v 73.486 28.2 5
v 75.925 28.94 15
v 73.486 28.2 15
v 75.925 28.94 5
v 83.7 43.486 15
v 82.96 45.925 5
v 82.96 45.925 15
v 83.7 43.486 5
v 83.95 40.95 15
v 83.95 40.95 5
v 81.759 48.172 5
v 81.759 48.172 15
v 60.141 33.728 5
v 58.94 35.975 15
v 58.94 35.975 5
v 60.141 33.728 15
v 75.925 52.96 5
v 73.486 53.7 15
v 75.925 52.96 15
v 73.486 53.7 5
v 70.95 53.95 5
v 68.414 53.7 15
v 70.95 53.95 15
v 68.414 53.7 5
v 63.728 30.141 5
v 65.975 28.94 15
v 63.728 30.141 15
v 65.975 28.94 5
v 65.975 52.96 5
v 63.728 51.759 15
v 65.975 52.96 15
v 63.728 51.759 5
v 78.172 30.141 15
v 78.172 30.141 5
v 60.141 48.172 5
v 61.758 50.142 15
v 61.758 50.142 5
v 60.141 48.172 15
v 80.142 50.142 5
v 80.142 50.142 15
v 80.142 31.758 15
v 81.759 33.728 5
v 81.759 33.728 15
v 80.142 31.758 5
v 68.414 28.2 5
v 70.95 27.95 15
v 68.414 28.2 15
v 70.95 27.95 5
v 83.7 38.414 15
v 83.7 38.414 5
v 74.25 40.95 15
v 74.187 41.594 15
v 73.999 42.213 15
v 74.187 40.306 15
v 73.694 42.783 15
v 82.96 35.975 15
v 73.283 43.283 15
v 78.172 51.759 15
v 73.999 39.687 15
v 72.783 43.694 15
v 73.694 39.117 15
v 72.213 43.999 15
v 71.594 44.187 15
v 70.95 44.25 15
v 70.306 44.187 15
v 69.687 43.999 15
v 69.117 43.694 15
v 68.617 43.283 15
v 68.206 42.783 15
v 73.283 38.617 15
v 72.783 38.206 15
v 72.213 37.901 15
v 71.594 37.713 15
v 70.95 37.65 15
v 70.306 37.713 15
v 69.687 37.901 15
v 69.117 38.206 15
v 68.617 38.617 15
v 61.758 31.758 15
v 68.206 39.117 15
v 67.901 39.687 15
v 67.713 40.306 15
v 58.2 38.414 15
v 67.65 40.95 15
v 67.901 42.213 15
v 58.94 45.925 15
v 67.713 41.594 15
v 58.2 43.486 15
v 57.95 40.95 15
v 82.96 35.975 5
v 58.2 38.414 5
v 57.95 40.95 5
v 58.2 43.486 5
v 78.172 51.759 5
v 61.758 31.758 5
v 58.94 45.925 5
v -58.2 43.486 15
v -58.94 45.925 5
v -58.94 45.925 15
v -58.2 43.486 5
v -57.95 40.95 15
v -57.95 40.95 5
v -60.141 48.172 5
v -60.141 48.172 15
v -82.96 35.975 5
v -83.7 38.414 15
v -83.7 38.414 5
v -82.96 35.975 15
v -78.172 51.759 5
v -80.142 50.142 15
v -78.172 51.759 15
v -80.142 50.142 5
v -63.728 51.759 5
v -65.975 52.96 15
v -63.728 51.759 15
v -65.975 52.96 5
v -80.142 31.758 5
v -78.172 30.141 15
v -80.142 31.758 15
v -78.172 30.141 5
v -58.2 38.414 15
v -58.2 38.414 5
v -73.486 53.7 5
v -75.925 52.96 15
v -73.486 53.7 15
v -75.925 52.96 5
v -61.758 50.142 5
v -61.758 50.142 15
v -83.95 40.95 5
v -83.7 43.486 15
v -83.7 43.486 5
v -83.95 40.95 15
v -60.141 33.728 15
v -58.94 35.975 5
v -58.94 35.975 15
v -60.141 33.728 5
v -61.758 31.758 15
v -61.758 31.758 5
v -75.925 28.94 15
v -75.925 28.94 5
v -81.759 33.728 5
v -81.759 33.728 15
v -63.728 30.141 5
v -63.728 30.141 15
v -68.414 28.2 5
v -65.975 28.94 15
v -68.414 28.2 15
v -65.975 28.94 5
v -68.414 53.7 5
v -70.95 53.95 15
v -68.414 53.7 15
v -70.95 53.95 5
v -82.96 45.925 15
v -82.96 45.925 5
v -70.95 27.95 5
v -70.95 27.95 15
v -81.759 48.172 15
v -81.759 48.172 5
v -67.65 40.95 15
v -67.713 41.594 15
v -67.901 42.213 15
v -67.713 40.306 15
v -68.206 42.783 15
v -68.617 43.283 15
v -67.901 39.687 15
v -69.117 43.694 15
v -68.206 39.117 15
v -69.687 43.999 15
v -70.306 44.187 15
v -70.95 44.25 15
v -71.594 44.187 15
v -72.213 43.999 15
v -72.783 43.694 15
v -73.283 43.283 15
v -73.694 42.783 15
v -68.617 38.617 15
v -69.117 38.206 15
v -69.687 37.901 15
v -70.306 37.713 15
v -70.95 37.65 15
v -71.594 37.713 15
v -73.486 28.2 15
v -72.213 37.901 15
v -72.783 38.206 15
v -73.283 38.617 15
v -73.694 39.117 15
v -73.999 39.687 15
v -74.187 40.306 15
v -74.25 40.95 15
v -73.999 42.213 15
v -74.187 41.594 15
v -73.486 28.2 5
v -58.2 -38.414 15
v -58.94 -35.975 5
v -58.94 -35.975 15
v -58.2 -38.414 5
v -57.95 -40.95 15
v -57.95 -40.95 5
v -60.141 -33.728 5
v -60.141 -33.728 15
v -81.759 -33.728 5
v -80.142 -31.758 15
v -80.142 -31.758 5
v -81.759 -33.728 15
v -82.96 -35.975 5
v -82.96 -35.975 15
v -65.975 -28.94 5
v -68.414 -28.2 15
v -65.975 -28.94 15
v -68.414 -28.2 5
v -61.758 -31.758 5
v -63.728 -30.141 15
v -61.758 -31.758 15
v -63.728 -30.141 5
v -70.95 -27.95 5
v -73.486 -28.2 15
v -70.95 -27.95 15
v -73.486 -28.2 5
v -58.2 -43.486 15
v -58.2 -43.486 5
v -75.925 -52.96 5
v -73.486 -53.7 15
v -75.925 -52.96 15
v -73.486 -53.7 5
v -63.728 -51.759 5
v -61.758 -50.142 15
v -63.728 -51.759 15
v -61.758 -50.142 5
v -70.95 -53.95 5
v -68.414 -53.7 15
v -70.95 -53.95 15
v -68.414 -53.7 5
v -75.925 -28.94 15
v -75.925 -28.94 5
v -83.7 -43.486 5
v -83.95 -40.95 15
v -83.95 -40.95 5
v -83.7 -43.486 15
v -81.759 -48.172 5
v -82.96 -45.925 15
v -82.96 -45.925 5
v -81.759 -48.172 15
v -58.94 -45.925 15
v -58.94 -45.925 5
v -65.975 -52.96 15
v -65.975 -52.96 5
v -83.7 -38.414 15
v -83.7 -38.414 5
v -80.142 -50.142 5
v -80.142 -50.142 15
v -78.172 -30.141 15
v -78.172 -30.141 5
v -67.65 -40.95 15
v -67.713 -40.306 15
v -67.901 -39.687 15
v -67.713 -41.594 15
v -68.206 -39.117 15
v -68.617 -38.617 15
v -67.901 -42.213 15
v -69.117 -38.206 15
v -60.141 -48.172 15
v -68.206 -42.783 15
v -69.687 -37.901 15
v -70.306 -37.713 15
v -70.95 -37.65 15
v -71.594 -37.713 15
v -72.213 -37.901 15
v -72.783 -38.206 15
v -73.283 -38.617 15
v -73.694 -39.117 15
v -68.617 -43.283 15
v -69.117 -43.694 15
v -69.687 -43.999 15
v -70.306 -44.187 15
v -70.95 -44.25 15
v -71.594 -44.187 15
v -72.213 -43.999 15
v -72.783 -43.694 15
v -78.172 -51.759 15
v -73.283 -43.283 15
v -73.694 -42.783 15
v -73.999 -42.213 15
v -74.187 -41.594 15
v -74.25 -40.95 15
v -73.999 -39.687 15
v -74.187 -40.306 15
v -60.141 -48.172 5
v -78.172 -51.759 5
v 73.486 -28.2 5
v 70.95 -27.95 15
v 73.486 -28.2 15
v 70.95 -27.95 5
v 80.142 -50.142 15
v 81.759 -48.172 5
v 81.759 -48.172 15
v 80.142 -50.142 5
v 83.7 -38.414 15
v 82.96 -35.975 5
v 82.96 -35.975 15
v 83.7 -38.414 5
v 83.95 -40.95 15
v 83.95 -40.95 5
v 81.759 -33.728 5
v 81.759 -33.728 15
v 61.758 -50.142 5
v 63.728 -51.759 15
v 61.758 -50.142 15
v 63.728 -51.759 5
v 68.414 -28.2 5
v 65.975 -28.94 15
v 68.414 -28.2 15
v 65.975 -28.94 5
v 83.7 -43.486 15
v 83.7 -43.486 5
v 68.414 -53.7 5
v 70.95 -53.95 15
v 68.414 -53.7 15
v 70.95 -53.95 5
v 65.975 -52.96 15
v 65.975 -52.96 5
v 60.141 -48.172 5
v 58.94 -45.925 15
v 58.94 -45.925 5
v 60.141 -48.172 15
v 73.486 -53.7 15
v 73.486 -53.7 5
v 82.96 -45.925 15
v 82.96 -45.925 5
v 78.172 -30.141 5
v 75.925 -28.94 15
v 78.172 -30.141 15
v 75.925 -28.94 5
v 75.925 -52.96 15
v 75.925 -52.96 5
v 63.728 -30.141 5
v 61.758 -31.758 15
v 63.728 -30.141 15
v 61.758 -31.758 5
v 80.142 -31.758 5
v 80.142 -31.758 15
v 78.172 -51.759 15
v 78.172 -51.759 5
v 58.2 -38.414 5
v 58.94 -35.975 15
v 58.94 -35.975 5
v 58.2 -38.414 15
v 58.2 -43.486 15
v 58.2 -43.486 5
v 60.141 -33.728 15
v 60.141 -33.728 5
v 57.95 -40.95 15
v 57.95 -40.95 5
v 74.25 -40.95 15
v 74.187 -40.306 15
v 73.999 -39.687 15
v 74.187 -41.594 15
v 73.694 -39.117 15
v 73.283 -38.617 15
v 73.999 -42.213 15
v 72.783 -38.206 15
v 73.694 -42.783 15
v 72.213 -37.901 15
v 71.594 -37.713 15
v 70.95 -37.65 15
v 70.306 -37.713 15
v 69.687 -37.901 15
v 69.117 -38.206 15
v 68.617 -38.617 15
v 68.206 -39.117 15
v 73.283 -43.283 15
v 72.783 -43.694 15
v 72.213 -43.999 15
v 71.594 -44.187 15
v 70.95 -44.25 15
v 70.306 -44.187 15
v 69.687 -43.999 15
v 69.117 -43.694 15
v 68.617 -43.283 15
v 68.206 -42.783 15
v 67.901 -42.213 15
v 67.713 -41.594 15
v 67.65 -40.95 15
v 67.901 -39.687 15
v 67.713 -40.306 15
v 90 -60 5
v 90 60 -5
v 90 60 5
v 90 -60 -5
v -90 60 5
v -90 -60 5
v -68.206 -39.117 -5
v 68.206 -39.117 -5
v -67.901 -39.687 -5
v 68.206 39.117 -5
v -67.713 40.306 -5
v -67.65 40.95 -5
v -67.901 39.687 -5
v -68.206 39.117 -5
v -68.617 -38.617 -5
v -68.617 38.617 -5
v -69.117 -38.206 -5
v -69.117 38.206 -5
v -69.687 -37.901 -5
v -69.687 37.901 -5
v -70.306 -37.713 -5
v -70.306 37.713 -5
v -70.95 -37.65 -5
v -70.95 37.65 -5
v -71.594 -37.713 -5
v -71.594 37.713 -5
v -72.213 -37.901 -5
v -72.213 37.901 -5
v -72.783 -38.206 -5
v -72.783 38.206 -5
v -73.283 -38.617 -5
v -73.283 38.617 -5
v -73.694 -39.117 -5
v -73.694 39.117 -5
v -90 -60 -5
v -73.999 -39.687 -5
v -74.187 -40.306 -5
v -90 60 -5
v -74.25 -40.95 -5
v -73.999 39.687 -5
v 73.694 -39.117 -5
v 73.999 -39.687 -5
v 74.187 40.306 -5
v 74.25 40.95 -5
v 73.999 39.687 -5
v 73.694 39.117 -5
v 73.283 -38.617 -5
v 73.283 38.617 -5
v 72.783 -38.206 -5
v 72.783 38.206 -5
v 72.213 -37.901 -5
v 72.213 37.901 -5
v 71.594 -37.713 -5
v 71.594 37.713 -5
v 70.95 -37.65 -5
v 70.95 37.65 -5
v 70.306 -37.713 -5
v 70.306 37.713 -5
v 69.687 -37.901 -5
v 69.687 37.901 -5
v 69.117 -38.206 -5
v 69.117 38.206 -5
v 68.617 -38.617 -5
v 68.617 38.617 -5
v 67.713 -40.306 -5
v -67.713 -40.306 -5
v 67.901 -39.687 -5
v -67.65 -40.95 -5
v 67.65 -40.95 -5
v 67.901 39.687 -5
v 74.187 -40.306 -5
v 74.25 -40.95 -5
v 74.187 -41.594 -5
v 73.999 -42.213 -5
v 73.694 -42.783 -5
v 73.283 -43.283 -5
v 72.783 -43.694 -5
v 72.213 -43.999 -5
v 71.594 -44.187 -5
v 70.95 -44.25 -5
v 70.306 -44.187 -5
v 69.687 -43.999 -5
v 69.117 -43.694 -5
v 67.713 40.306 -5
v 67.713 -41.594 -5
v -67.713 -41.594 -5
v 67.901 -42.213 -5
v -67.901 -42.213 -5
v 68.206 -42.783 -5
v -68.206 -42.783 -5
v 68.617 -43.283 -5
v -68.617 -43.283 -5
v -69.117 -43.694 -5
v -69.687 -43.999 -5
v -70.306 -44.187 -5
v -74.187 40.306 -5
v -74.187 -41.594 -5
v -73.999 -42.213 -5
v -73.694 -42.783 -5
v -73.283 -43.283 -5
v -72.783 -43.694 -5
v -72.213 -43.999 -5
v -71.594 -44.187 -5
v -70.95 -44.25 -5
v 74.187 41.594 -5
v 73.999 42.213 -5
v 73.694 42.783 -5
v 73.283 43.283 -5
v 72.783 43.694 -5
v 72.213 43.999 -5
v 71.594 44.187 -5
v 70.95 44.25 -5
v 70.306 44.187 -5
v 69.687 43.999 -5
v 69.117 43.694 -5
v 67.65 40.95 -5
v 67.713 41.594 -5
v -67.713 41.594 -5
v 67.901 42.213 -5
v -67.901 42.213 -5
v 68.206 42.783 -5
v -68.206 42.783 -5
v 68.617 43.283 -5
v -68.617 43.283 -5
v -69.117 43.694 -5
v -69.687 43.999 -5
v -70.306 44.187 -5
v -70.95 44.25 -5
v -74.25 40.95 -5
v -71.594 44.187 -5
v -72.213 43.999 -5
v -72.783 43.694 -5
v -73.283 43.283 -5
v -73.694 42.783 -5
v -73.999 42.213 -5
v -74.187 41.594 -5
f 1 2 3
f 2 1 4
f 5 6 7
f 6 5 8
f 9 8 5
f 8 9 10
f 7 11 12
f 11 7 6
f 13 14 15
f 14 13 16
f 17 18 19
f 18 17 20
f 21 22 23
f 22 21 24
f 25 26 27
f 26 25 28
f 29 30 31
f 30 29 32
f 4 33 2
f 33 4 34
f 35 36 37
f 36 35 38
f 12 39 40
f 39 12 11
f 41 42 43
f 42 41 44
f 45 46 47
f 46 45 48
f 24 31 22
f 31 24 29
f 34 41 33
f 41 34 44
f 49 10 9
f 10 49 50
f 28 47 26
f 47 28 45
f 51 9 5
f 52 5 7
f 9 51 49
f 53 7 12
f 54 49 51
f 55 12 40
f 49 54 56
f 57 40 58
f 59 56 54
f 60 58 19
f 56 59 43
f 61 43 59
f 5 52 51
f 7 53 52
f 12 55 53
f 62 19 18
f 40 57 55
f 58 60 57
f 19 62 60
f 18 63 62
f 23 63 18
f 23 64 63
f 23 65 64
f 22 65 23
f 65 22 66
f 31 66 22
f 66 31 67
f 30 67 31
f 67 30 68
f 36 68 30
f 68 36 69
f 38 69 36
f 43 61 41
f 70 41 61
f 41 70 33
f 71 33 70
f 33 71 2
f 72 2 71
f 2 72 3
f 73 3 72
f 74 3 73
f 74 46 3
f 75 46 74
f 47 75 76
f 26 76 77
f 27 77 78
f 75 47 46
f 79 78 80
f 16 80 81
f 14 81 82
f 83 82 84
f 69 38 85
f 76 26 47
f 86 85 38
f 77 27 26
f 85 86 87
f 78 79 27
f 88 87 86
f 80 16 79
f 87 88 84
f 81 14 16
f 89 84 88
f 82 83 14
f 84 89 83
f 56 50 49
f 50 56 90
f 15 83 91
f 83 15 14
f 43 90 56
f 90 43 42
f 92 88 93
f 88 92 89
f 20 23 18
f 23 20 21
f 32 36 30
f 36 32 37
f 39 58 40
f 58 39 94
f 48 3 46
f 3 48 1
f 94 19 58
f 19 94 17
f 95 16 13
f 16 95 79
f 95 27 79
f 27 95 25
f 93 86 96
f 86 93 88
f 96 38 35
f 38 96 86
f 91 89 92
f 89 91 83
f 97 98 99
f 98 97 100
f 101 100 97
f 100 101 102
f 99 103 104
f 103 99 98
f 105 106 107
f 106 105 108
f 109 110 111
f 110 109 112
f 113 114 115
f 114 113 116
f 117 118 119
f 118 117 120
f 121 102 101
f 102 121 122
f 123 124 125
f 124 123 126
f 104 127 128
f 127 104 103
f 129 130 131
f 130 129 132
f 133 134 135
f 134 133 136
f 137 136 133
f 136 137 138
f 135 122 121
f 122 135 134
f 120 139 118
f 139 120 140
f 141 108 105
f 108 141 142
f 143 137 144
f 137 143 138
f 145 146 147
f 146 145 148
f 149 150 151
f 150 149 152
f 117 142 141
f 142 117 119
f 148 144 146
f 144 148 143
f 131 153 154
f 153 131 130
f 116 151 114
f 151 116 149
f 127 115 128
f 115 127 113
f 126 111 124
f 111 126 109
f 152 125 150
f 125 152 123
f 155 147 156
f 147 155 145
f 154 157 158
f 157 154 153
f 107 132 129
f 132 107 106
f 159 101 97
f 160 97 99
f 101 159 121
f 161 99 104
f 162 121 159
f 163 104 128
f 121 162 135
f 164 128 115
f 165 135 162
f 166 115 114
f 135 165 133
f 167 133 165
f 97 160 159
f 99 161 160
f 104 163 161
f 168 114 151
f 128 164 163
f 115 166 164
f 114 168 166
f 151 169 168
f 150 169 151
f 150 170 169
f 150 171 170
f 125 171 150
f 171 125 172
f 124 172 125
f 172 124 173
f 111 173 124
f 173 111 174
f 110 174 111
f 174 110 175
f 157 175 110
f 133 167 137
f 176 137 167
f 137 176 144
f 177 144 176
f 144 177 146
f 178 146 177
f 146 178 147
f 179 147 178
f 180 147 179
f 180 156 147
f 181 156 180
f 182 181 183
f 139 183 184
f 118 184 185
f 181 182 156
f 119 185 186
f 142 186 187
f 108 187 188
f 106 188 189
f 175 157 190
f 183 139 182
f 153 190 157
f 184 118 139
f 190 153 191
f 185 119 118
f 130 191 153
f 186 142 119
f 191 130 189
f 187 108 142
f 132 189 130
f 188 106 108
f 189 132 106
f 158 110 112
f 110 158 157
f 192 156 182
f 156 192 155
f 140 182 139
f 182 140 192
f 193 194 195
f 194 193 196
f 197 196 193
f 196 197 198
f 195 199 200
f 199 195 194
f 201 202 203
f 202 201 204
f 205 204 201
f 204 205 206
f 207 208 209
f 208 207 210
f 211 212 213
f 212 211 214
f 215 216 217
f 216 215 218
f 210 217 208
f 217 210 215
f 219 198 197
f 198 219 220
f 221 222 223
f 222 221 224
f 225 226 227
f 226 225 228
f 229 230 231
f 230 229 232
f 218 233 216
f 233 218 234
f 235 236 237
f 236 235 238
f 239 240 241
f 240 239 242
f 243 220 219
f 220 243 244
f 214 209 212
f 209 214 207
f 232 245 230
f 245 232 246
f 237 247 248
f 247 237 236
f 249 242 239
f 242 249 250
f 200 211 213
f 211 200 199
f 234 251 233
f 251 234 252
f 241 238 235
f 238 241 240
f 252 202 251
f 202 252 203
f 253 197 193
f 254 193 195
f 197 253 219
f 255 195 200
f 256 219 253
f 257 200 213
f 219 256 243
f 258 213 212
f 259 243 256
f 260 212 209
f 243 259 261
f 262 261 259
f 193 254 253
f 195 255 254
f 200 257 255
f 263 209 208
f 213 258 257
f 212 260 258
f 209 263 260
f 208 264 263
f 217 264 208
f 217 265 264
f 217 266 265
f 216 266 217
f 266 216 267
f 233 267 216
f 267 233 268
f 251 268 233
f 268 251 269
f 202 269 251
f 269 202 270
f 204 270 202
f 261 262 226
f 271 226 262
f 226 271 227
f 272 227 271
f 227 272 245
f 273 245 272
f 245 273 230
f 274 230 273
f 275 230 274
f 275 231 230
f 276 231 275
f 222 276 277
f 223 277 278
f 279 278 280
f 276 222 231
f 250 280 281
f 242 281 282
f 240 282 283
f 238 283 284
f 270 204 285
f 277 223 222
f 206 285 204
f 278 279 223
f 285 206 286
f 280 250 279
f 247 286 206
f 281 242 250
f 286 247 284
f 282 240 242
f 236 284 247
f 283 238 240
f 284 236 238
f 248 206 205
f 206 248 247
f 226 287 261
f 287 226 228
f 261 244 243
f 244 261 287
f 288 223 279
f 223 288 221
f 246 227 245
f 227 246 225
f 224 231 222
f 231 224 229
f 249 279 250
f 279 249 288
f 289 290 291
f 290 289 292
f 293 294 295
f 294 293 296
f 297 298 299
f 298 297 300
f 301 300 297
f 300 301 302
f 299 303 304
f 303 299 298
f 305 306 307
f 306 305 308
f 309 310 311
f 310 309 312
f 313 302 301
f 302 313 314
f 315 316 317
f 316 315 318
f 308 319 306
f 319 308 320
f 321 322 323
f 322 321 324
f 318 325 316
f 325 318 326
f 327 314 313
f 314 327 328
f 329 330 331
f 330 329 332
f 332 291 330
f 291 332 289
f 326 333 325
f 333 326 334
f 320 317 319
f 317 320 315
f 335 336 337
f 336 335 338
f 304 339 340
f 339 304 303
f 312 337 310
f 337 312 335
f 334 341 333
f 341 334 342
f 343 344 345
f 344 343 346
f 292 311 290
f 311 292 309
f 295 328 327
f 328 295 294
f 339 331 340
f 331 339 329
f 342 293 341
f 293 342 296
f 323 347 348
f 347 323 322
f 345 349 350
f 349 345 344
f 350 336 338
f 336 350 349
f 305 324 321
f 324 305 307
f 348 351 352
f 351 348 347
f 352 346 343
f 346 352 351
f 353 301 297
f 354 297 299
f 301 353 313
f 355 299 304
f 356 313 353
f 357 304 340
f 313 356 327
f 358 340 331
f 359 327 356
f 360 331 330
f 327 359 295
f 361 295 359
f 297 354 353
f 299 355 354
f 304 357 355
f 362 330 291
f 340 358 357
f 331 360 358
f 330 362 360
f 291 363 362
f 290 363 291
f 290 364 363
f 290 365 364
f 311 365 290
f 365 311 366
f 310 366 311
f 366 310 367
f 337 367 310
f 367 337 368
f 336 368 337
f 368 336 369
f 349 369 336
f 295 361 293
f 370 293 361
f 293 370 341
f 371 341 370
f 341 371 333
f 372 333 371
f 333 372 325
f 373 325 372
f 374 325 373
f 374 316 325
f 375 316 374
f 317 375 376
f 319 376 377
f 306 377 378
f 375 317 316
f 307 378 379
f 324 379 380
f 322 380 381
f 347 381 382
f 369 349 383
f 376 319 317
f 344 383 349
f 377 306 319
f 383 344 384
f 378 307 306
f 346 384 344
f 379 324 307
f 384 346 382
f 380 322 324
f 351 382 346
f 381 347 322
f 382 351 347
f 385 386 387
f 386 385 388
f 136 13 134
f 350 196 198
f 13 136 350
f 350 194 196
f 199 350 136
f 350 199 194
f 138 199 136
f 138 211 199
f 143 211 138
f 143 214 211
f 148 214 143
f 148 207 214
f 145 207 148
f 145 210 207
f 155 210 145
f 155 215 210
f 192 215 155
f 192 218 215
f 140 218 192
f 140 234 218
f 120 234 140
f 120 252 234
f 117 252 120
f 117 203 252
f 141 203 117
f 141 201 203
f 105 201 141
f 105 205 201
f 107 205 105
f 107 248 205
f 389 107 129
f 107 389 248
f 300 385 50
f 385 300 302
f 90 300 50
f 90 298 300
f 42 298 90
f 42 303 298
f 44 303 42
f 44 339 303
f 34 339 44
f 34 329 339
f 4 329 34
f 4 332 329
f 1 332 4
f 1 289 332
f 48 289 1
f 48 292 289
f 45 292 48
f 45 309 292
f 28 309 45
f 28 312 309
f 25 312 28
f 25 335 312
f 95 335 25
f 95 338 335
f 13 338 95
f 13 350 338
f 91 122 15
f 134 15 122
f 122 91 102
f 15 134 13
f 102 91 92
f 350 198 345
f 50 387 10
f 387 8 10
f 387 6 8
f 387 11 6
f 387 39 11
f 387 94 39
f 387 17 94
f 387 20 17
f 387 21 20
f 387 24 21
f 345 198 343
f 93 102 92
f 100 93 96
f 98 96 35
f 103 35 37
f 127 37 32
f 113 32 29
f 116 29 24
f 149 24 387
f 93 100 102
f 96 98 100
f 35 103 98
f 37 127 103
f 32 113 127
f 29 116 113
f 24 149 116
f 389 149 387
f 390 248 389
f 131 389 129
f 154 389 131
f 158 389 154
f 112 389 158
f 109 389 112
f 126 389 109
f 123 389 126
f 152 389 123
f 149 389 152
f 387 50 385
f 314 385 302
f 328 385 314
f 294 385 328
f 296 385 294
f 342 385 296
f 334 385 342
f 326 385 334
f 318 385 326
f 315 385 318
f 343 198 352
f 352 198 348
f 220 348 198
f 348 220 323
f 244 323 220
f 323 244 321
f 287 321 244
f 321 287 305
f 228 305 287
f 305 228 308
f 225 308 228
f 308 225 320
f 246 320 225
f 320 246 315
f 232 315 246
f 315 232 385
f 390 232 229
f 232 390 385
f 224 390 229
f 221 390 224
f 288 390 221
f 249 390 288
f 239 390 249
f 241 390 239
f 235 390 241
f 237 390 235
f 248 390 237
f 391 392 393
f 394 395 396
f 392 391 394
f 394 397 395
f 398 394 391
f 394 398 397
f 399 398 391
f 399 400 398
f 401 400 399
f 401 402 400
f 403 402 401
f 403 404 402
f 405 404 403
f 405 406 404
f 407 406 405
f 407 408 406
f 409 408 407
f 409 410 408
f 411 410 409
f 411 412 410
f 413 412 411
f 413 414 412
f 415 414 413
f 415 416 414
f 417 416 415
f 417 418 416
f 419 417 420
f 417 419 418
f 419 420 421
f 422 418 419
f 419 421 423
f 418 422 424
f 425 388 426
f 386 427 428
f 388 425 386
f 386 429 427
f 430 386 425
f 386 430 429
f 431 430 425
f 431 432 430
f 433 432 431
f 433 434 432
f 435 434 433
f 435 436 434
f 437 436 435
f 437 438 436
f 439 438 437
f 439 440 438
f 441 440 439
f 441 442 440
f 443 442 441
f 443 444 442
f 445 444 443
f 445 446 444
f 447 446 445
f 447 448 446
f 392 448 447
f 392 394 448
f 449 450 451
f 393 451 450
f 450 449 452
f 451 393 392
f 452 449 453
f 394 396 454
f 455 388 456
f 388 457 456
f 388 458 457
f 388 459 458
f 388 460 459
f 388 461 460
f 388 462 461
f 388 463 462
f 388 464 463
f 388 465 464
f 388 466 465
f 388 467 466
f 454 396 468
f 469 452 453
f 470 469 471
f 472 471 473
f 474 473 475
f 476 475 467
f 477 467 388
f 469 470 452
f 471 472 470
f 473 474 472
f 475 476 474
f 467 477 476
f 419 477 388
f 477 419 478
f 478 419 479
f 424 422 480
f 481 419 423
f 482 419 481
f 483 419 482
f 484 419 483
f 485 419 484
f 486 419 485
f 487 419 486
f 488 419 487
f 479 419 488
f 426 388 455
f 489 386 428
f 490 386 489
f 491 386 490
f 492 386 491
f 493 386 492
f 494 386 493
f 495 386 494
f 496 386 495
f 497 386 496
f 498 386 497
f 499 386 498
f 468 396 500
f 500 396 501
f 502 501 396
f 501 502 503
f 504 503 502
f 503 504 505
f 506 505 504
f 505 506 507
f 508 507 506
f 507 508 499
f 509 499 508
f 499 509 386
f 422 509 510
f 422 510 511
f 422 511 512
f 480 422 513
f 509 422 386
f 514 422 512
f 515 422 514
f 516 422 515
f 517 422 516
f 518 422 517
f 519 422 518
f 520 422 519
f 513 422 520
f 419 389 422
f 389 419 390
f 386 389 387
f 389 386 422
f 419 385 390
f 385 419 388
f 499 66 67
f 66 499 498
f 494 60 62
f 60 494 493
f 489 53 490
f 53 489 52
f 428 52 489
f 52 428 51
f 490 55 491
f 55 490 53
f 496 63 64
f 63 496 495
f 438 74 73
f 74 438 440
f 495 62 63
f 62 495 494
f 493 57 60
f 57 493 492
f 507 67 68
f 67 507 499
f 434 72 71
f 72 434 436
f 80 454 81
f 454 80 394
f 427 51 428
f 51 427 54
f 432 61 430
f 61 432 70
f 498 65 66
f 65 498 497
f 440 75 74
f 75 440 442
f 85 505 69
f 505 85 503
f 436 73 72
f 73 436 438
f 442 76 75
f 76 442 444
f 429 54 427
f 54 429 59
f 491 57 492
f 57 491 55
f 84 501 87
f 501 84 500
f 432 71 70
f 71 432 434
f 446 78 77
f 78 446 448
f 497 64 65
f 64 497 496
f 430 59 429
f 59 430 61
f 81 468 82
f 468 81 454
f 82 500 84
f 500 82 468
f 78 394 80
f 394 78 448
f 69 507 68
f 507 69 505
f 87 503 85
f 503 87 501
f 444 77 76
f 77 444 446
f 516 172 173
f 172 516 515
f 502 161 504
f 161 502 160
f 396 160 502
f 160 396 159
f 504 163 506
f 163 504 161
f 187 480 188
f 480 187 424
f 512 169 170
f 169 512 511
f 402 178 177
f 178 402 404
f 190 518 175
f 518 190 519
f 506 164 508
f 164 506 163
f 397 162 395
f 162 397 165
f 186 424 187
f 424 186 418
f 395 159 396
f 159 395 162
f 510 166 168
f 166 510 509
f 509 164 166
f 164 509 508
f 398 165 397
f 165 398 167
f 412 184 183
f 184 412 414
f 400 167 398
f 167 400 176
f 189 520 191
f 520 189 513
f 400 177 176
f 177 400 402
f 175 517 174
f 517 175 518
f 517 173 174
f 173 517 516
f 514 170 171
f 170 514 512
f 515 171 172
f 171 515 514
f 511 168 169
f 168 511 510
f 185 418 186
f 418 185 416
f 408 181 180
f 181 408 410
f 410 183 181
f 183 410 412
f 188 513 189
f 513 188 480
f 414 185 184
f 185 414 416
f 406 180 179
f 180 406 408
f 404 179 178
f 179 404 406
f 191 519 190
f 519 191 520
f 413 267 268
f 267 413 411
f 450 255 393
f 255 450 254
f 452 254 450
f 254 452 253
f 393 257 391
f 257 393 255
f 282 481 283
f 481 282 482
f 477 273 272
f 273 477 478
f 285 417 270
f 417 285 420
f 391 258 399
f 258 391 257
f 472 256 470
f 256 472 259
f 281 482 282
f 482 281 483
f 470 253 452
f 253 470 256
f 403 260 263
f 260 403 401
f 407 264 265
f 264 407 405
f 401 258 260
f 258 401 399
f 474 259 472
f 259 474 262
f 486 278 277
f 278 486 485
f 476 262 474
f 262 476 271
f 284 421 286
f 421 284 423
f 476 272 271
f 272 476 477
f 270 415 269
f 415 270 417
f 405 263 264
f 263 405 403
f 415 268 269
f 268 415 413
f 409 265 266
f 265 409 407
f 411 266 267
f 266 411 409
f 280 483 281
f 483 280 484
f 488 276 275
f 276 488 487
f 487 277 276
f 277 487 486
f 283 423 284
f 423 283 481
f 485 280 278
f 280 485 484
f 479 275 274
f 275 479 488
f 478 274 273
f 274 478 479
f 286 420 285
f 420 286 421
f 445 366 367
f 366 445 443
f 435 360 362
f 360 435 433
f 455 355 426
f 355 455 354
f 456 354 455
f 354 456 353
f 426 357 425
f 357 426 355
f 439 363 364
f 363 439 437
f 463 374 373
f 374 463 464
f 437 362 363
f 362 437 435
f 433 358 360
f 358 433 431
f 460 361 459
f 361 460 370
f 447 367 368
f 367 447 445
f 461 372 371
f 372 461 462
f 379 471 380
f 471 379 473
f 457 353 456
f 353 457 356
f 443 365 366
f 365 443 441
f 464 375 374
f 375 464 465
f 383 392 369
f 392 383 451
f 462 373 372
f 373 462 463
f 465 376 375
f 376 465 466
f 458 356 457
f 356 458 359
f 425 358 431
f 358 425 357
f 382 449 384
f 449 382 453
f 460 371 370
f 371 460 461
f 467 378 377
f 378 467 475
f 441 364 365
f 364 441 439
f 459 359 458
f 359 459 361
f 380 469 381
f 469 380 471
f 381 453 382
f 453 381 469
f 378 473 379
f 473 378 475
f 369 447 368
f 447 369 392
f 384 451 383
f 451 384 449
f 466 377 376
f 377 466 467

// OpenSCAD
$fn = 32;

// ----------------------------------------------------------------------
// Anchor pads 180 x 120 x 20
// four corner bosses with anchor holes
// ----------------------------------------------------------------------

// --- parameters (mm) ---
plate = [180, 120, 10];  // base plate size (x, y, z)
pads = 4;                // boss count, one per corner
edge = 19.05;            // boss centre offset from the plate edge
boss_d = 26;             // boss diameter
boss_h = 10;             // boss height above the base plate
hole_d = 6.6;            // hole diameter

// --- derived feature positions (mm) ---
height = plate[2] + boss_h;      // = 20   overall height of the part
corner_x = plate[0] / 2 - edge;  // = 70.95   boss centre X
corner_y = plate[1] / 2 - edge;  // = 40.95   boss centre Y
feature_centers = [
  [corner_x, corner_y],
  [-corner_x, corner_y],
  [-corner_x, -corner_y],
  [corner_x, -corner_y]
];   // boss centres, anchor holes are drilled there

// base plate, four bosses standing on it, anchor holes all the way through
difference() {
  union() {
    cube(plate, center = true);
    for (centre = feature_centers)
      translate([centre[0], centre[1], plate[2] / 2 - 1])
        cylinder(d = boss_d, h = boss_h + 1);
  }
  for (centre = feature_centers)
    translate([centre[0], centre[1], -height])
      cylinder(d = hole_d, h = 2 * height + 2);  // through boss and plate
}
